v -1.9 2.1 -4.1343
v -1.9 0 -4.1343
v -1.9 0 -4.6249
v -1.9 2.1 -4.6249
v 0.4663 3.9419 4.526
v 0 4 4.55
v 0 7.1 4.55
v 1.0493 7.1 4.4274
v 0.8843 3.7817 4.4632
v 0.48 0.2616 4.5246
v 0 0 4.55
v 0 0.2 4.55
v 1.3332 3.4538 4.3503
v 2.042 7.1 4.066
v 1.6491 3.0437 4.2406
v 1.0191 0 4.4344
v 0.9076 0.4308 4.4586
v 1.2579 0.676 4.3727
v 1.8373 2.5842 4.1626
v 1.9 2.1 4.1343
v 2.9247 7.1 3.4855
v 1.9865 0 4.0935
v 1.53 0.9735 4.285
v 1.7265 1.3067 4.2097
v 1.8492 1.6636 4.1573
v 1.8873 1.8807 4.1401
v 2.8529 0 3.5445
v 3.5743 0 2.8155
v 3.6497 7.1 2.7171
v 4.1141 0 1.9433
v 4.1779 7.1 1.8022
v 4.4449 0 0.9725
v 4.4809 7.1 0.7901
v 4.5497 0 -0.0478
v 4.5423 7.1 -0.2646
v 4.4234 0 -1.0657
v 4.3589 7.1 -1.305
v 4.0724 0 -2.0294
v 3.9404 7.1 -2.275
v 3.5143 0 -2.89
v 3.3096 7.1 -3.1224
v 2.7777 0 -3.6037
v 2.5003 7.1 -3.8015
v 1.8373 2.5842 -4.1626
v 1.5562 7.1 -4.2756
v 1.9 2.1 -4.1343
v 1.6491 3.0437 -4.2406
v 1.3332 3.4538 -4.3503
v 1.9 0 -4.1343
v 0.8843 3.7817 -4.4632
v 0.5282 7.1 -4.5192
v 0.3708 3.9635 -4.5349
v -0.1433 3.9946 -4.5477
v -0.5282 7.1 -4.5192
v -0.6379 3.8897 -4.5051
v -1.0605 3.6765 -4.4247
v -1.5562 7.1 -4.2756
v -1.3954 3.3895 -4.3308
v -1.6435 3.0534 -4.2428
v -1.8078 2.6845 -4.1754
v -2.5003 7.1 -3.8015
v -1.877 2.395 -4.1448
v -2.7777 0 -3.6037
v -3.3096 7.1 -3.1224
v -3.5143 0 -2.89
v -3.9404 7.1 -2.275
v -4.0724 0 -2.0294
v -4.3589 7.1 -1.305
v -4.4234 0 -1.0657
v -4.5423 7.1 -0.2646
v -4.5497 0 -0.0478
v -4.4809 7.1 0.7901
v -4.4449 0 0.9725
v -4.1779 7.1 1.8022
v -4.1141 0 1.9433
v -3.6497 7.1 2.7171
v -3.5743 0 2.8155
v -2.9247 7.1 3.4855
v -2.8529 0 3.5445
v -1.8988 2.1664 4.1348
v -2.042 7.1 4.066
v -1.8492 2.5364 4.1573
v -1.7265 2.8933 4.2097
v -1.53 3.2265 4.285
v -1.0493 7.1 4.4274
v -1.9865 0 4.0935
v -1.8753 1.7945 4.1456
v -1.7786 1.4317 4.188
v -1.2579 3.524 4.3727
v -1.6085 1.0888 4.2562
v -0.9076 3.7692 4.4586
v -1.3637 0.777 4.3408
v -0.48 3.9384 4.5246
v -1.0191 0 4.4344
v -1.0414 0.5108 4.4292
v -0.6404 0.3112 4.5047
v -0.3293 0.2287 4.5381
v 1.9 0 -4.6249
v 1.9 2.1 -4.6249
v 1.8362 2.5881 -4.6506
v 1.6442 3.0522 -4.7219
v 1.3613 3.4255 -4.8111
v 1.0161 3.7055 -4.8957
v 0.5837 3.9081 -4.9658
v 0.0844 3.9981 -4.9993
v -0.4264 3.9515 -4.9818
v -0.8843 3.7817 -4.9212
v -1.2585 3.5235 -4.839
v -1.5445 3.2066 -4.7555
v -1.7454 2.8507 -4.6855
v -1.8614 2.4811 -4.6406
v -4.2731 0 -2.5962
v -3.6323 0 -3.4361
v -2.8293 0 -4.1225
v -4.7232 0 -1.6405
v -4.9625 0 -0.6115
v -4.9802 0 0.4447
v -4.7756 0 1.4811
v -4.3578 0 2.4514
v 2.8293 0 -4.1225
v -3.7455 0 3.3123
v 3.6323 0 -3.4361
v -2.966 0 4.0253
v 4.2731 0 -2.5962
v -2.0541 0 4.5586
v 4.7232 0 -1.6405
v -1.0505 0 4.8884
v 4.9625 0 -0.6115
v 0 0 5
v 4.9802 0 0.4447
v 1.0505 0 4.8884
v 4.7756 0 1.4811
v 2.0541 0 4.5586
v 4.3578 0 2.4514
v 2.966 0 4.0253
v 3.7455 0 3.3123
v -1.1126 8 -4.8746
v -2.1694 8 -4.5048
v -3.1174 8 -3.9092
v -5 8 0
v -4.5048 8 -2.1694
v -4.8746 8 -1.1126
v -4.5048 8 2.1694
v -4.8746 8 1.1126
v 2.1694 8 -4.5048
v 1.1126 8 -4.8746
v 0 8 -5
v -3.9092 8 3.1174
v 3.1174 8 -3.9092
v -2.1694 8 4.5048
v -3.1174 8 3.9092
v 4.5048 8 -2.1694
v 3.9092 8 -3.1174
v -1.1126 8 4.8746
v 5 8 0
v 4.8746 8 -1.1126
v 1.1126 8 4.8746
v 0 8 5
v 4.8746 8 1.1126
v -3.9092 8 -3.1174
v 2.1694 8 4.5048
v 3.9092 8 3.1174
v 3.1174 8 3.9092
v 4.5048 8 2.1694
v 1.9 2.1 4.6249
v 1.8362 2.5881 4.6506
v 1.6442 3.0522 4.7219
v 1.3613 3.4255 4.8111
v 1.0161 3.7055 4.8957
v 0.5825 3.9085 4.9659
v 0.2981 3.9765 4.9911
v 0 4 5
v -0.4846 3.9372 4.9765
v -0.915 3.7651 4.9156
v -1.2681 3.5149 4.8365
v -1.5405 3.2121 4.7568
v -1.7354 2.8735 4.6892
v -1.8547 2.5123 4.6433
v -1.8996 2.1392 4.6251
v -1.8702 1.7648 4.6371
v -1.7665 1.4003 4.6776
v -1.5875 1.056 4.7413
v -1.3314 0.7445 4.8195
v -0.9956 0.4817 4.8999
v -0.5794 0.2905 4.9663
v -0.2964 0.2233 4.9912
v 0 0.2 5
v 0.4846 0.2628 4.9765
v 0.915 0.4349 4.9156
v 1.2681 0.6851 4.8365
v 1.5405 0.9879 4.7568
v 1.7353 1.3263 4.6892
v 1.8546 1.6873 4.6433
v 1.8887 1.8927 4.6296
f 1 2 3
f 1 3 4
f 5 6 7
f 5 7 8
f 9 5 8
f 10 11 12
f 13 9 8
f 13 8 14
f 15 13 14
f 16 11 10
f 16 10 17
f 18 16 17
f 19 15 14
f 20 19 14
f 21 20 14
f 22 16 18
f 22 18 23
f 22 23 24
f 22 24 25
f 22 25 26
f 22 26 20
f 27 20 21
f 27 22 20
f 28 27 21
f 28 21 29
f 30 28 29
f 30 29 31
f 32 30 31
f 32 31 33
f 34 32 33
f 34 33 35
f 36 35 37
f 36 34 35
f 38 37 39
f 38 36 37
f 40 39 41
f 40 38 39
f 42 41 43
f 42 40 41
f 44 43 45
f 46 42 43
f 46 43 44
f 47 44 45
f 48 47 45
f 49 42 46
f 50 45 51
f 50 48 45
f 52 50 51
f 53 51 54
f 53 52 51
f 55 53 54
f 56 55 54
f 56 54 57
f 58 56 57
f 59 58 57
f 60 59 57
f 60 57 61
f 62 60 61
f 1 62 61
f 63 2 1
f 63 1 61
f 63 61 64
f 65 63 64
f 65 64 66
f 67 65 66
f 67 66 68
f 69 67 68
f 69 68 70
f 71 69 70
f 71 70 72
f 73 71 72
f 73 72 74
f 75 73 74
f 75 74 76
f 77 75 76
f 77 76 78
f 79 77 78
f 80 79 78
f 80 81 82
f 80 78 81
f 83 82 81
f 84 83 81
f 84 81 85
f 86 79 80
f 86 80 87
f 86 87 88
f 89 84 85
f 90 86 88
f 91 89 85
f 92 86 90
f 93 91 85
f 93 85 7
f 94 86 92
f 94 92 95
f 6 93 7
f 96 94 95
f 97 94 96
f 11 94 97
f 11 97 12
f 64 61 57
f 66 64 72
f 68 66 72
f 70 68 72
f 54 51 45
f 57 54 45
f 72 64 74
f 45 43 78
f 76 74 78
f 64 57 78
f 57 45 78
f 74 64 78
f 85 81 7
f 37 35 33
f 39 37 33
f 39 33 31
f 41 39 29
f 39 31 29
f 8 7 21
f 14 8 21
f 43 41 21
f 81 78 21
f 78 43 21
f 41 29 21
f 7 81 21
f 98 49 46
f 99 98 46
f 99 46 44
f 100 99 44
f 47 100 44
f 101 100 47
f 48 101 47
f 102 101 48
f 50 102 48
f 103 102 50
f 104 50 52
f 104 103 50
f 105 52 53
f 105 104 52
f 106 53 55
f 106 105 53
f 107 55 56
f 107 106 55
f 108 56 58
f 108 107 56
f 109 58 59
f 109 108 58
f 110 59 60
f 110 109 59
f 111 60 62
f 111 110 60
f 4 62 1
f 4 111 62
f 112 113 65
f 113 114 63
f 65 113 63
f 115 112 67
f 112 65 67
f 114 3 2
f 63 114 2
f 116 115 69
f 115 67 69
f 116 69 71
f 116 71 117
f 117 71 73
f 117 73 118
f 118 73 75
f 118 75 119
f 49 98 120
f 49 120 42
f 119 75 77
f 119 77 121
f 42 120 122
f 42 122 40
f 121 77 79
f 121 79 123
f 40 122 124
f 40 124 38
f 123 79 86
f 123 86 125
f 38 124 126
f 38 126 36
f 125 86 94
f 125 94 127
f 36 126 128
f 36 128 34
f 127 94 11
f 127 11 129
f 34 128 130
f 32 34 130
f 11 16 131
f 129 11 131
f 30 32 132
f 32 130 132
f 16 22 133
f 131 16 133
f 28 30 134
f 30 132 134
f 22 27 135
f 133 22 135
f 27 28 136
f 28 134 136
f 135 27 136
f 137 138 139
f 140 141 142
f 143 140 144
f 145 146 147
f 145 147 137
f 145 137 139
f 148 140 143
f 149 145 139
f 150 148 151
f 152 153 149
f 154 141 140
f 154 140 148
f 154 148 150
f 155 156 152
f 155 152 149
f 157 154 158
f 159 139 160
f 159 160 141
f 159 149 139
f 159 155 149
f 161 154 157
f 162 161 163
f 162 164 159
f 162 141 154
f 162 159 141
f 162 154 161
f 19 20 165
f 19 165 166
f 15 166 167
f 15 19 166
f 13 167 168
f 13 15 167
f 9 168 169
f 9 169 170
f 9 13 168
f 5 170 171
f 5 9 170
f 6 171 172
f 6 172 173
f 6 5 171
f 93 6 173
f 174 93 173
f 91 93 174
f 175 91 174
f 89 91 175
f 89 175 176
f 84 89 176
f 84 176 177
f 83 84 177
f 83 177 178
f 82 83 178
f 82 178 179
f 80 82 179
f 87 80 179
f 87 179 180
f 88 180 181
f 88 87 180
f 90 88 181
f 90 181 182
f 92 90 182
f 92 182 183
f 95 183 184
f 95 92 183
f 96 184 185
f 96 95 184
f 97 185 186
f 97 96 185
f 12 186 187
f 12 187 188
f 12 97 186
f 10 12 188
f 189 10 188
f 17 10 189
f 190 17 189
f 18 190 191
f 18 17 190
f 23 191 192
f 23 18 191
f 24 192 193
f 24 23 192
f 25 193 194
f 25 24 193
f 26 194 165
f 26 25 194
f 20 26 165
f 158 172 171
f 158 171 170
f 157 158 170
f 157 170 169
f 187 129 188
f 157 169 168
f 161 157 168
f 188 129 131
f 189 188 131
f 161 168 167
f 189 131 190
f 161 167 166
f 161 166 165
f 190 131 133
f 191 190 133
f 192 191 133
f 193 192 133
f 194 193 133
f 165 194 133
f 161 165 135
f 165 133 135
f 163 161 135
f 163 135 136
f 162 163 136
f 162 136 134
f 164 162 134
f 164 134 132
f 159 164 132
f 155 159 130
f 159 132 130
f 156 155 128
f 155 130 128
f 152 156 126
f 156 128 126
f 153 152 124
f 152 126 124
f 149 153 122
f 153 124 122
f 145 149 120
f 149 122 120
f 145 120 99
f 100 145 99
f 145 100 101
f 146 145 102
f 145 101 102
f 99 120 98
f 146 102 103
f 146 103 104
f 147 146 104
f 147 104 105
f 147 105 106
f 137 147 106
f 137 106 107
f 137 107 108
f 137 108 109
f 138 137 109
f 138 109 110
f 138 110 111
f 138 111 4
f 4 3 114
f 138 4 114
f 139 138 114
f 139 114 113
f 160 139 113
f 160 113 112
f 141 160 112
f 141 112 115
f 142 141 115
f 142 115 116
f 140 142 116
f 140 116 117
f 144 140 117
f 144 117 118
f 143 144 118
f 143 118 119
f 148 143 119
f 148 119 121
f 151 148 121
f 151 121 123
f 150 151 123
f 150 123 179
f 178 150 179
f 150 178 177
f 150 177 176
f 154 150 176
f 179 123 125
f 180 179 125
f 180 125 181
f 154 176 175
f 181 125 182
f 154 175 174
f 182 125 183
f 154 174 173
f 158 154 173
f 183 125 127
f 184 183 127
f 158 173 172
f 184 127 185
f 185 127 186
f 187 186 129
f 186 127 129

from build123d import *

# Parameters (mm, degrees)
SKETCH2_R               = 5
BOSS_EXTRUDE1_DEPTH     = 8
SKETCH4_R               = 4.55
CUT_EXTRUDE1_DEPTH      = 7.1
CUT_EXTRUDE2_DEPTH      = 11.677078252
CUT_EXTRUDE2_DEPTH_BACK = 11.677078252
SKETCH12_R              = 1.9
SKETCH13_W              = 3.8
SKETCH13_H              = 2.1
CUT_EXTRUDE3_DEPTH      = 10


with BuildPart() as part:
    # Sketch2 → Boss-Extrude1 (new body)
    with BuildSketch(Plane(origin=(0, 0, 0), x_dir=(1, 0, 0), z_dir=(0, 1, 0))):
        with Locations(Location((0, 0, 0), (0, 0, 270))):
            Circle(SKETCH2_R)
    extrude(amount=BOSS_EXTRUDE1_DEPTH)

    # Sketch4 → Cut-Extrude1 (cut)
    with BuildSketch(Plane(origin=(0, 0, 0), x_dir=(1, 0, 0), z_dir=(0, 1, 0))):
        with Locations(Location((0, 0, 0), (0, 0, 270))):
            Circle(SKETCH4_R)
    extrude(amount=CUT_EXTRUDE1_DEPTH, mode=Mode.SUBTRACT)

    # Sketch12 → Cut-Extrude2 (cut, two sides: drawn at the far end of the back side and taken through both)
    with BuildSketch(Plane.XY.offset(-CUT_EXTRUDE2_DEPTH_BACK)):
        with Locations((0, 2.1)):
            Circle(SKETCH12_R)
    extrude(amount=CUT_EXTRUDE2_DEPTH + CUT_EXTRUDE2_DEPTH_BACK, mode=Mode.SUBTRACT)

    # Sketch13 → Cut-Extrude3 (cut)
    with BuildSketch(Plane.XY):
        with Locations((0, 1.05)):
            Rectangle(SKETCH13_W, SKETCH13_H)
    extrude(amount=-CUT_EXTRUDE3_DEPTH, mode=Mode.SUBTRACT)


solid = part.part
